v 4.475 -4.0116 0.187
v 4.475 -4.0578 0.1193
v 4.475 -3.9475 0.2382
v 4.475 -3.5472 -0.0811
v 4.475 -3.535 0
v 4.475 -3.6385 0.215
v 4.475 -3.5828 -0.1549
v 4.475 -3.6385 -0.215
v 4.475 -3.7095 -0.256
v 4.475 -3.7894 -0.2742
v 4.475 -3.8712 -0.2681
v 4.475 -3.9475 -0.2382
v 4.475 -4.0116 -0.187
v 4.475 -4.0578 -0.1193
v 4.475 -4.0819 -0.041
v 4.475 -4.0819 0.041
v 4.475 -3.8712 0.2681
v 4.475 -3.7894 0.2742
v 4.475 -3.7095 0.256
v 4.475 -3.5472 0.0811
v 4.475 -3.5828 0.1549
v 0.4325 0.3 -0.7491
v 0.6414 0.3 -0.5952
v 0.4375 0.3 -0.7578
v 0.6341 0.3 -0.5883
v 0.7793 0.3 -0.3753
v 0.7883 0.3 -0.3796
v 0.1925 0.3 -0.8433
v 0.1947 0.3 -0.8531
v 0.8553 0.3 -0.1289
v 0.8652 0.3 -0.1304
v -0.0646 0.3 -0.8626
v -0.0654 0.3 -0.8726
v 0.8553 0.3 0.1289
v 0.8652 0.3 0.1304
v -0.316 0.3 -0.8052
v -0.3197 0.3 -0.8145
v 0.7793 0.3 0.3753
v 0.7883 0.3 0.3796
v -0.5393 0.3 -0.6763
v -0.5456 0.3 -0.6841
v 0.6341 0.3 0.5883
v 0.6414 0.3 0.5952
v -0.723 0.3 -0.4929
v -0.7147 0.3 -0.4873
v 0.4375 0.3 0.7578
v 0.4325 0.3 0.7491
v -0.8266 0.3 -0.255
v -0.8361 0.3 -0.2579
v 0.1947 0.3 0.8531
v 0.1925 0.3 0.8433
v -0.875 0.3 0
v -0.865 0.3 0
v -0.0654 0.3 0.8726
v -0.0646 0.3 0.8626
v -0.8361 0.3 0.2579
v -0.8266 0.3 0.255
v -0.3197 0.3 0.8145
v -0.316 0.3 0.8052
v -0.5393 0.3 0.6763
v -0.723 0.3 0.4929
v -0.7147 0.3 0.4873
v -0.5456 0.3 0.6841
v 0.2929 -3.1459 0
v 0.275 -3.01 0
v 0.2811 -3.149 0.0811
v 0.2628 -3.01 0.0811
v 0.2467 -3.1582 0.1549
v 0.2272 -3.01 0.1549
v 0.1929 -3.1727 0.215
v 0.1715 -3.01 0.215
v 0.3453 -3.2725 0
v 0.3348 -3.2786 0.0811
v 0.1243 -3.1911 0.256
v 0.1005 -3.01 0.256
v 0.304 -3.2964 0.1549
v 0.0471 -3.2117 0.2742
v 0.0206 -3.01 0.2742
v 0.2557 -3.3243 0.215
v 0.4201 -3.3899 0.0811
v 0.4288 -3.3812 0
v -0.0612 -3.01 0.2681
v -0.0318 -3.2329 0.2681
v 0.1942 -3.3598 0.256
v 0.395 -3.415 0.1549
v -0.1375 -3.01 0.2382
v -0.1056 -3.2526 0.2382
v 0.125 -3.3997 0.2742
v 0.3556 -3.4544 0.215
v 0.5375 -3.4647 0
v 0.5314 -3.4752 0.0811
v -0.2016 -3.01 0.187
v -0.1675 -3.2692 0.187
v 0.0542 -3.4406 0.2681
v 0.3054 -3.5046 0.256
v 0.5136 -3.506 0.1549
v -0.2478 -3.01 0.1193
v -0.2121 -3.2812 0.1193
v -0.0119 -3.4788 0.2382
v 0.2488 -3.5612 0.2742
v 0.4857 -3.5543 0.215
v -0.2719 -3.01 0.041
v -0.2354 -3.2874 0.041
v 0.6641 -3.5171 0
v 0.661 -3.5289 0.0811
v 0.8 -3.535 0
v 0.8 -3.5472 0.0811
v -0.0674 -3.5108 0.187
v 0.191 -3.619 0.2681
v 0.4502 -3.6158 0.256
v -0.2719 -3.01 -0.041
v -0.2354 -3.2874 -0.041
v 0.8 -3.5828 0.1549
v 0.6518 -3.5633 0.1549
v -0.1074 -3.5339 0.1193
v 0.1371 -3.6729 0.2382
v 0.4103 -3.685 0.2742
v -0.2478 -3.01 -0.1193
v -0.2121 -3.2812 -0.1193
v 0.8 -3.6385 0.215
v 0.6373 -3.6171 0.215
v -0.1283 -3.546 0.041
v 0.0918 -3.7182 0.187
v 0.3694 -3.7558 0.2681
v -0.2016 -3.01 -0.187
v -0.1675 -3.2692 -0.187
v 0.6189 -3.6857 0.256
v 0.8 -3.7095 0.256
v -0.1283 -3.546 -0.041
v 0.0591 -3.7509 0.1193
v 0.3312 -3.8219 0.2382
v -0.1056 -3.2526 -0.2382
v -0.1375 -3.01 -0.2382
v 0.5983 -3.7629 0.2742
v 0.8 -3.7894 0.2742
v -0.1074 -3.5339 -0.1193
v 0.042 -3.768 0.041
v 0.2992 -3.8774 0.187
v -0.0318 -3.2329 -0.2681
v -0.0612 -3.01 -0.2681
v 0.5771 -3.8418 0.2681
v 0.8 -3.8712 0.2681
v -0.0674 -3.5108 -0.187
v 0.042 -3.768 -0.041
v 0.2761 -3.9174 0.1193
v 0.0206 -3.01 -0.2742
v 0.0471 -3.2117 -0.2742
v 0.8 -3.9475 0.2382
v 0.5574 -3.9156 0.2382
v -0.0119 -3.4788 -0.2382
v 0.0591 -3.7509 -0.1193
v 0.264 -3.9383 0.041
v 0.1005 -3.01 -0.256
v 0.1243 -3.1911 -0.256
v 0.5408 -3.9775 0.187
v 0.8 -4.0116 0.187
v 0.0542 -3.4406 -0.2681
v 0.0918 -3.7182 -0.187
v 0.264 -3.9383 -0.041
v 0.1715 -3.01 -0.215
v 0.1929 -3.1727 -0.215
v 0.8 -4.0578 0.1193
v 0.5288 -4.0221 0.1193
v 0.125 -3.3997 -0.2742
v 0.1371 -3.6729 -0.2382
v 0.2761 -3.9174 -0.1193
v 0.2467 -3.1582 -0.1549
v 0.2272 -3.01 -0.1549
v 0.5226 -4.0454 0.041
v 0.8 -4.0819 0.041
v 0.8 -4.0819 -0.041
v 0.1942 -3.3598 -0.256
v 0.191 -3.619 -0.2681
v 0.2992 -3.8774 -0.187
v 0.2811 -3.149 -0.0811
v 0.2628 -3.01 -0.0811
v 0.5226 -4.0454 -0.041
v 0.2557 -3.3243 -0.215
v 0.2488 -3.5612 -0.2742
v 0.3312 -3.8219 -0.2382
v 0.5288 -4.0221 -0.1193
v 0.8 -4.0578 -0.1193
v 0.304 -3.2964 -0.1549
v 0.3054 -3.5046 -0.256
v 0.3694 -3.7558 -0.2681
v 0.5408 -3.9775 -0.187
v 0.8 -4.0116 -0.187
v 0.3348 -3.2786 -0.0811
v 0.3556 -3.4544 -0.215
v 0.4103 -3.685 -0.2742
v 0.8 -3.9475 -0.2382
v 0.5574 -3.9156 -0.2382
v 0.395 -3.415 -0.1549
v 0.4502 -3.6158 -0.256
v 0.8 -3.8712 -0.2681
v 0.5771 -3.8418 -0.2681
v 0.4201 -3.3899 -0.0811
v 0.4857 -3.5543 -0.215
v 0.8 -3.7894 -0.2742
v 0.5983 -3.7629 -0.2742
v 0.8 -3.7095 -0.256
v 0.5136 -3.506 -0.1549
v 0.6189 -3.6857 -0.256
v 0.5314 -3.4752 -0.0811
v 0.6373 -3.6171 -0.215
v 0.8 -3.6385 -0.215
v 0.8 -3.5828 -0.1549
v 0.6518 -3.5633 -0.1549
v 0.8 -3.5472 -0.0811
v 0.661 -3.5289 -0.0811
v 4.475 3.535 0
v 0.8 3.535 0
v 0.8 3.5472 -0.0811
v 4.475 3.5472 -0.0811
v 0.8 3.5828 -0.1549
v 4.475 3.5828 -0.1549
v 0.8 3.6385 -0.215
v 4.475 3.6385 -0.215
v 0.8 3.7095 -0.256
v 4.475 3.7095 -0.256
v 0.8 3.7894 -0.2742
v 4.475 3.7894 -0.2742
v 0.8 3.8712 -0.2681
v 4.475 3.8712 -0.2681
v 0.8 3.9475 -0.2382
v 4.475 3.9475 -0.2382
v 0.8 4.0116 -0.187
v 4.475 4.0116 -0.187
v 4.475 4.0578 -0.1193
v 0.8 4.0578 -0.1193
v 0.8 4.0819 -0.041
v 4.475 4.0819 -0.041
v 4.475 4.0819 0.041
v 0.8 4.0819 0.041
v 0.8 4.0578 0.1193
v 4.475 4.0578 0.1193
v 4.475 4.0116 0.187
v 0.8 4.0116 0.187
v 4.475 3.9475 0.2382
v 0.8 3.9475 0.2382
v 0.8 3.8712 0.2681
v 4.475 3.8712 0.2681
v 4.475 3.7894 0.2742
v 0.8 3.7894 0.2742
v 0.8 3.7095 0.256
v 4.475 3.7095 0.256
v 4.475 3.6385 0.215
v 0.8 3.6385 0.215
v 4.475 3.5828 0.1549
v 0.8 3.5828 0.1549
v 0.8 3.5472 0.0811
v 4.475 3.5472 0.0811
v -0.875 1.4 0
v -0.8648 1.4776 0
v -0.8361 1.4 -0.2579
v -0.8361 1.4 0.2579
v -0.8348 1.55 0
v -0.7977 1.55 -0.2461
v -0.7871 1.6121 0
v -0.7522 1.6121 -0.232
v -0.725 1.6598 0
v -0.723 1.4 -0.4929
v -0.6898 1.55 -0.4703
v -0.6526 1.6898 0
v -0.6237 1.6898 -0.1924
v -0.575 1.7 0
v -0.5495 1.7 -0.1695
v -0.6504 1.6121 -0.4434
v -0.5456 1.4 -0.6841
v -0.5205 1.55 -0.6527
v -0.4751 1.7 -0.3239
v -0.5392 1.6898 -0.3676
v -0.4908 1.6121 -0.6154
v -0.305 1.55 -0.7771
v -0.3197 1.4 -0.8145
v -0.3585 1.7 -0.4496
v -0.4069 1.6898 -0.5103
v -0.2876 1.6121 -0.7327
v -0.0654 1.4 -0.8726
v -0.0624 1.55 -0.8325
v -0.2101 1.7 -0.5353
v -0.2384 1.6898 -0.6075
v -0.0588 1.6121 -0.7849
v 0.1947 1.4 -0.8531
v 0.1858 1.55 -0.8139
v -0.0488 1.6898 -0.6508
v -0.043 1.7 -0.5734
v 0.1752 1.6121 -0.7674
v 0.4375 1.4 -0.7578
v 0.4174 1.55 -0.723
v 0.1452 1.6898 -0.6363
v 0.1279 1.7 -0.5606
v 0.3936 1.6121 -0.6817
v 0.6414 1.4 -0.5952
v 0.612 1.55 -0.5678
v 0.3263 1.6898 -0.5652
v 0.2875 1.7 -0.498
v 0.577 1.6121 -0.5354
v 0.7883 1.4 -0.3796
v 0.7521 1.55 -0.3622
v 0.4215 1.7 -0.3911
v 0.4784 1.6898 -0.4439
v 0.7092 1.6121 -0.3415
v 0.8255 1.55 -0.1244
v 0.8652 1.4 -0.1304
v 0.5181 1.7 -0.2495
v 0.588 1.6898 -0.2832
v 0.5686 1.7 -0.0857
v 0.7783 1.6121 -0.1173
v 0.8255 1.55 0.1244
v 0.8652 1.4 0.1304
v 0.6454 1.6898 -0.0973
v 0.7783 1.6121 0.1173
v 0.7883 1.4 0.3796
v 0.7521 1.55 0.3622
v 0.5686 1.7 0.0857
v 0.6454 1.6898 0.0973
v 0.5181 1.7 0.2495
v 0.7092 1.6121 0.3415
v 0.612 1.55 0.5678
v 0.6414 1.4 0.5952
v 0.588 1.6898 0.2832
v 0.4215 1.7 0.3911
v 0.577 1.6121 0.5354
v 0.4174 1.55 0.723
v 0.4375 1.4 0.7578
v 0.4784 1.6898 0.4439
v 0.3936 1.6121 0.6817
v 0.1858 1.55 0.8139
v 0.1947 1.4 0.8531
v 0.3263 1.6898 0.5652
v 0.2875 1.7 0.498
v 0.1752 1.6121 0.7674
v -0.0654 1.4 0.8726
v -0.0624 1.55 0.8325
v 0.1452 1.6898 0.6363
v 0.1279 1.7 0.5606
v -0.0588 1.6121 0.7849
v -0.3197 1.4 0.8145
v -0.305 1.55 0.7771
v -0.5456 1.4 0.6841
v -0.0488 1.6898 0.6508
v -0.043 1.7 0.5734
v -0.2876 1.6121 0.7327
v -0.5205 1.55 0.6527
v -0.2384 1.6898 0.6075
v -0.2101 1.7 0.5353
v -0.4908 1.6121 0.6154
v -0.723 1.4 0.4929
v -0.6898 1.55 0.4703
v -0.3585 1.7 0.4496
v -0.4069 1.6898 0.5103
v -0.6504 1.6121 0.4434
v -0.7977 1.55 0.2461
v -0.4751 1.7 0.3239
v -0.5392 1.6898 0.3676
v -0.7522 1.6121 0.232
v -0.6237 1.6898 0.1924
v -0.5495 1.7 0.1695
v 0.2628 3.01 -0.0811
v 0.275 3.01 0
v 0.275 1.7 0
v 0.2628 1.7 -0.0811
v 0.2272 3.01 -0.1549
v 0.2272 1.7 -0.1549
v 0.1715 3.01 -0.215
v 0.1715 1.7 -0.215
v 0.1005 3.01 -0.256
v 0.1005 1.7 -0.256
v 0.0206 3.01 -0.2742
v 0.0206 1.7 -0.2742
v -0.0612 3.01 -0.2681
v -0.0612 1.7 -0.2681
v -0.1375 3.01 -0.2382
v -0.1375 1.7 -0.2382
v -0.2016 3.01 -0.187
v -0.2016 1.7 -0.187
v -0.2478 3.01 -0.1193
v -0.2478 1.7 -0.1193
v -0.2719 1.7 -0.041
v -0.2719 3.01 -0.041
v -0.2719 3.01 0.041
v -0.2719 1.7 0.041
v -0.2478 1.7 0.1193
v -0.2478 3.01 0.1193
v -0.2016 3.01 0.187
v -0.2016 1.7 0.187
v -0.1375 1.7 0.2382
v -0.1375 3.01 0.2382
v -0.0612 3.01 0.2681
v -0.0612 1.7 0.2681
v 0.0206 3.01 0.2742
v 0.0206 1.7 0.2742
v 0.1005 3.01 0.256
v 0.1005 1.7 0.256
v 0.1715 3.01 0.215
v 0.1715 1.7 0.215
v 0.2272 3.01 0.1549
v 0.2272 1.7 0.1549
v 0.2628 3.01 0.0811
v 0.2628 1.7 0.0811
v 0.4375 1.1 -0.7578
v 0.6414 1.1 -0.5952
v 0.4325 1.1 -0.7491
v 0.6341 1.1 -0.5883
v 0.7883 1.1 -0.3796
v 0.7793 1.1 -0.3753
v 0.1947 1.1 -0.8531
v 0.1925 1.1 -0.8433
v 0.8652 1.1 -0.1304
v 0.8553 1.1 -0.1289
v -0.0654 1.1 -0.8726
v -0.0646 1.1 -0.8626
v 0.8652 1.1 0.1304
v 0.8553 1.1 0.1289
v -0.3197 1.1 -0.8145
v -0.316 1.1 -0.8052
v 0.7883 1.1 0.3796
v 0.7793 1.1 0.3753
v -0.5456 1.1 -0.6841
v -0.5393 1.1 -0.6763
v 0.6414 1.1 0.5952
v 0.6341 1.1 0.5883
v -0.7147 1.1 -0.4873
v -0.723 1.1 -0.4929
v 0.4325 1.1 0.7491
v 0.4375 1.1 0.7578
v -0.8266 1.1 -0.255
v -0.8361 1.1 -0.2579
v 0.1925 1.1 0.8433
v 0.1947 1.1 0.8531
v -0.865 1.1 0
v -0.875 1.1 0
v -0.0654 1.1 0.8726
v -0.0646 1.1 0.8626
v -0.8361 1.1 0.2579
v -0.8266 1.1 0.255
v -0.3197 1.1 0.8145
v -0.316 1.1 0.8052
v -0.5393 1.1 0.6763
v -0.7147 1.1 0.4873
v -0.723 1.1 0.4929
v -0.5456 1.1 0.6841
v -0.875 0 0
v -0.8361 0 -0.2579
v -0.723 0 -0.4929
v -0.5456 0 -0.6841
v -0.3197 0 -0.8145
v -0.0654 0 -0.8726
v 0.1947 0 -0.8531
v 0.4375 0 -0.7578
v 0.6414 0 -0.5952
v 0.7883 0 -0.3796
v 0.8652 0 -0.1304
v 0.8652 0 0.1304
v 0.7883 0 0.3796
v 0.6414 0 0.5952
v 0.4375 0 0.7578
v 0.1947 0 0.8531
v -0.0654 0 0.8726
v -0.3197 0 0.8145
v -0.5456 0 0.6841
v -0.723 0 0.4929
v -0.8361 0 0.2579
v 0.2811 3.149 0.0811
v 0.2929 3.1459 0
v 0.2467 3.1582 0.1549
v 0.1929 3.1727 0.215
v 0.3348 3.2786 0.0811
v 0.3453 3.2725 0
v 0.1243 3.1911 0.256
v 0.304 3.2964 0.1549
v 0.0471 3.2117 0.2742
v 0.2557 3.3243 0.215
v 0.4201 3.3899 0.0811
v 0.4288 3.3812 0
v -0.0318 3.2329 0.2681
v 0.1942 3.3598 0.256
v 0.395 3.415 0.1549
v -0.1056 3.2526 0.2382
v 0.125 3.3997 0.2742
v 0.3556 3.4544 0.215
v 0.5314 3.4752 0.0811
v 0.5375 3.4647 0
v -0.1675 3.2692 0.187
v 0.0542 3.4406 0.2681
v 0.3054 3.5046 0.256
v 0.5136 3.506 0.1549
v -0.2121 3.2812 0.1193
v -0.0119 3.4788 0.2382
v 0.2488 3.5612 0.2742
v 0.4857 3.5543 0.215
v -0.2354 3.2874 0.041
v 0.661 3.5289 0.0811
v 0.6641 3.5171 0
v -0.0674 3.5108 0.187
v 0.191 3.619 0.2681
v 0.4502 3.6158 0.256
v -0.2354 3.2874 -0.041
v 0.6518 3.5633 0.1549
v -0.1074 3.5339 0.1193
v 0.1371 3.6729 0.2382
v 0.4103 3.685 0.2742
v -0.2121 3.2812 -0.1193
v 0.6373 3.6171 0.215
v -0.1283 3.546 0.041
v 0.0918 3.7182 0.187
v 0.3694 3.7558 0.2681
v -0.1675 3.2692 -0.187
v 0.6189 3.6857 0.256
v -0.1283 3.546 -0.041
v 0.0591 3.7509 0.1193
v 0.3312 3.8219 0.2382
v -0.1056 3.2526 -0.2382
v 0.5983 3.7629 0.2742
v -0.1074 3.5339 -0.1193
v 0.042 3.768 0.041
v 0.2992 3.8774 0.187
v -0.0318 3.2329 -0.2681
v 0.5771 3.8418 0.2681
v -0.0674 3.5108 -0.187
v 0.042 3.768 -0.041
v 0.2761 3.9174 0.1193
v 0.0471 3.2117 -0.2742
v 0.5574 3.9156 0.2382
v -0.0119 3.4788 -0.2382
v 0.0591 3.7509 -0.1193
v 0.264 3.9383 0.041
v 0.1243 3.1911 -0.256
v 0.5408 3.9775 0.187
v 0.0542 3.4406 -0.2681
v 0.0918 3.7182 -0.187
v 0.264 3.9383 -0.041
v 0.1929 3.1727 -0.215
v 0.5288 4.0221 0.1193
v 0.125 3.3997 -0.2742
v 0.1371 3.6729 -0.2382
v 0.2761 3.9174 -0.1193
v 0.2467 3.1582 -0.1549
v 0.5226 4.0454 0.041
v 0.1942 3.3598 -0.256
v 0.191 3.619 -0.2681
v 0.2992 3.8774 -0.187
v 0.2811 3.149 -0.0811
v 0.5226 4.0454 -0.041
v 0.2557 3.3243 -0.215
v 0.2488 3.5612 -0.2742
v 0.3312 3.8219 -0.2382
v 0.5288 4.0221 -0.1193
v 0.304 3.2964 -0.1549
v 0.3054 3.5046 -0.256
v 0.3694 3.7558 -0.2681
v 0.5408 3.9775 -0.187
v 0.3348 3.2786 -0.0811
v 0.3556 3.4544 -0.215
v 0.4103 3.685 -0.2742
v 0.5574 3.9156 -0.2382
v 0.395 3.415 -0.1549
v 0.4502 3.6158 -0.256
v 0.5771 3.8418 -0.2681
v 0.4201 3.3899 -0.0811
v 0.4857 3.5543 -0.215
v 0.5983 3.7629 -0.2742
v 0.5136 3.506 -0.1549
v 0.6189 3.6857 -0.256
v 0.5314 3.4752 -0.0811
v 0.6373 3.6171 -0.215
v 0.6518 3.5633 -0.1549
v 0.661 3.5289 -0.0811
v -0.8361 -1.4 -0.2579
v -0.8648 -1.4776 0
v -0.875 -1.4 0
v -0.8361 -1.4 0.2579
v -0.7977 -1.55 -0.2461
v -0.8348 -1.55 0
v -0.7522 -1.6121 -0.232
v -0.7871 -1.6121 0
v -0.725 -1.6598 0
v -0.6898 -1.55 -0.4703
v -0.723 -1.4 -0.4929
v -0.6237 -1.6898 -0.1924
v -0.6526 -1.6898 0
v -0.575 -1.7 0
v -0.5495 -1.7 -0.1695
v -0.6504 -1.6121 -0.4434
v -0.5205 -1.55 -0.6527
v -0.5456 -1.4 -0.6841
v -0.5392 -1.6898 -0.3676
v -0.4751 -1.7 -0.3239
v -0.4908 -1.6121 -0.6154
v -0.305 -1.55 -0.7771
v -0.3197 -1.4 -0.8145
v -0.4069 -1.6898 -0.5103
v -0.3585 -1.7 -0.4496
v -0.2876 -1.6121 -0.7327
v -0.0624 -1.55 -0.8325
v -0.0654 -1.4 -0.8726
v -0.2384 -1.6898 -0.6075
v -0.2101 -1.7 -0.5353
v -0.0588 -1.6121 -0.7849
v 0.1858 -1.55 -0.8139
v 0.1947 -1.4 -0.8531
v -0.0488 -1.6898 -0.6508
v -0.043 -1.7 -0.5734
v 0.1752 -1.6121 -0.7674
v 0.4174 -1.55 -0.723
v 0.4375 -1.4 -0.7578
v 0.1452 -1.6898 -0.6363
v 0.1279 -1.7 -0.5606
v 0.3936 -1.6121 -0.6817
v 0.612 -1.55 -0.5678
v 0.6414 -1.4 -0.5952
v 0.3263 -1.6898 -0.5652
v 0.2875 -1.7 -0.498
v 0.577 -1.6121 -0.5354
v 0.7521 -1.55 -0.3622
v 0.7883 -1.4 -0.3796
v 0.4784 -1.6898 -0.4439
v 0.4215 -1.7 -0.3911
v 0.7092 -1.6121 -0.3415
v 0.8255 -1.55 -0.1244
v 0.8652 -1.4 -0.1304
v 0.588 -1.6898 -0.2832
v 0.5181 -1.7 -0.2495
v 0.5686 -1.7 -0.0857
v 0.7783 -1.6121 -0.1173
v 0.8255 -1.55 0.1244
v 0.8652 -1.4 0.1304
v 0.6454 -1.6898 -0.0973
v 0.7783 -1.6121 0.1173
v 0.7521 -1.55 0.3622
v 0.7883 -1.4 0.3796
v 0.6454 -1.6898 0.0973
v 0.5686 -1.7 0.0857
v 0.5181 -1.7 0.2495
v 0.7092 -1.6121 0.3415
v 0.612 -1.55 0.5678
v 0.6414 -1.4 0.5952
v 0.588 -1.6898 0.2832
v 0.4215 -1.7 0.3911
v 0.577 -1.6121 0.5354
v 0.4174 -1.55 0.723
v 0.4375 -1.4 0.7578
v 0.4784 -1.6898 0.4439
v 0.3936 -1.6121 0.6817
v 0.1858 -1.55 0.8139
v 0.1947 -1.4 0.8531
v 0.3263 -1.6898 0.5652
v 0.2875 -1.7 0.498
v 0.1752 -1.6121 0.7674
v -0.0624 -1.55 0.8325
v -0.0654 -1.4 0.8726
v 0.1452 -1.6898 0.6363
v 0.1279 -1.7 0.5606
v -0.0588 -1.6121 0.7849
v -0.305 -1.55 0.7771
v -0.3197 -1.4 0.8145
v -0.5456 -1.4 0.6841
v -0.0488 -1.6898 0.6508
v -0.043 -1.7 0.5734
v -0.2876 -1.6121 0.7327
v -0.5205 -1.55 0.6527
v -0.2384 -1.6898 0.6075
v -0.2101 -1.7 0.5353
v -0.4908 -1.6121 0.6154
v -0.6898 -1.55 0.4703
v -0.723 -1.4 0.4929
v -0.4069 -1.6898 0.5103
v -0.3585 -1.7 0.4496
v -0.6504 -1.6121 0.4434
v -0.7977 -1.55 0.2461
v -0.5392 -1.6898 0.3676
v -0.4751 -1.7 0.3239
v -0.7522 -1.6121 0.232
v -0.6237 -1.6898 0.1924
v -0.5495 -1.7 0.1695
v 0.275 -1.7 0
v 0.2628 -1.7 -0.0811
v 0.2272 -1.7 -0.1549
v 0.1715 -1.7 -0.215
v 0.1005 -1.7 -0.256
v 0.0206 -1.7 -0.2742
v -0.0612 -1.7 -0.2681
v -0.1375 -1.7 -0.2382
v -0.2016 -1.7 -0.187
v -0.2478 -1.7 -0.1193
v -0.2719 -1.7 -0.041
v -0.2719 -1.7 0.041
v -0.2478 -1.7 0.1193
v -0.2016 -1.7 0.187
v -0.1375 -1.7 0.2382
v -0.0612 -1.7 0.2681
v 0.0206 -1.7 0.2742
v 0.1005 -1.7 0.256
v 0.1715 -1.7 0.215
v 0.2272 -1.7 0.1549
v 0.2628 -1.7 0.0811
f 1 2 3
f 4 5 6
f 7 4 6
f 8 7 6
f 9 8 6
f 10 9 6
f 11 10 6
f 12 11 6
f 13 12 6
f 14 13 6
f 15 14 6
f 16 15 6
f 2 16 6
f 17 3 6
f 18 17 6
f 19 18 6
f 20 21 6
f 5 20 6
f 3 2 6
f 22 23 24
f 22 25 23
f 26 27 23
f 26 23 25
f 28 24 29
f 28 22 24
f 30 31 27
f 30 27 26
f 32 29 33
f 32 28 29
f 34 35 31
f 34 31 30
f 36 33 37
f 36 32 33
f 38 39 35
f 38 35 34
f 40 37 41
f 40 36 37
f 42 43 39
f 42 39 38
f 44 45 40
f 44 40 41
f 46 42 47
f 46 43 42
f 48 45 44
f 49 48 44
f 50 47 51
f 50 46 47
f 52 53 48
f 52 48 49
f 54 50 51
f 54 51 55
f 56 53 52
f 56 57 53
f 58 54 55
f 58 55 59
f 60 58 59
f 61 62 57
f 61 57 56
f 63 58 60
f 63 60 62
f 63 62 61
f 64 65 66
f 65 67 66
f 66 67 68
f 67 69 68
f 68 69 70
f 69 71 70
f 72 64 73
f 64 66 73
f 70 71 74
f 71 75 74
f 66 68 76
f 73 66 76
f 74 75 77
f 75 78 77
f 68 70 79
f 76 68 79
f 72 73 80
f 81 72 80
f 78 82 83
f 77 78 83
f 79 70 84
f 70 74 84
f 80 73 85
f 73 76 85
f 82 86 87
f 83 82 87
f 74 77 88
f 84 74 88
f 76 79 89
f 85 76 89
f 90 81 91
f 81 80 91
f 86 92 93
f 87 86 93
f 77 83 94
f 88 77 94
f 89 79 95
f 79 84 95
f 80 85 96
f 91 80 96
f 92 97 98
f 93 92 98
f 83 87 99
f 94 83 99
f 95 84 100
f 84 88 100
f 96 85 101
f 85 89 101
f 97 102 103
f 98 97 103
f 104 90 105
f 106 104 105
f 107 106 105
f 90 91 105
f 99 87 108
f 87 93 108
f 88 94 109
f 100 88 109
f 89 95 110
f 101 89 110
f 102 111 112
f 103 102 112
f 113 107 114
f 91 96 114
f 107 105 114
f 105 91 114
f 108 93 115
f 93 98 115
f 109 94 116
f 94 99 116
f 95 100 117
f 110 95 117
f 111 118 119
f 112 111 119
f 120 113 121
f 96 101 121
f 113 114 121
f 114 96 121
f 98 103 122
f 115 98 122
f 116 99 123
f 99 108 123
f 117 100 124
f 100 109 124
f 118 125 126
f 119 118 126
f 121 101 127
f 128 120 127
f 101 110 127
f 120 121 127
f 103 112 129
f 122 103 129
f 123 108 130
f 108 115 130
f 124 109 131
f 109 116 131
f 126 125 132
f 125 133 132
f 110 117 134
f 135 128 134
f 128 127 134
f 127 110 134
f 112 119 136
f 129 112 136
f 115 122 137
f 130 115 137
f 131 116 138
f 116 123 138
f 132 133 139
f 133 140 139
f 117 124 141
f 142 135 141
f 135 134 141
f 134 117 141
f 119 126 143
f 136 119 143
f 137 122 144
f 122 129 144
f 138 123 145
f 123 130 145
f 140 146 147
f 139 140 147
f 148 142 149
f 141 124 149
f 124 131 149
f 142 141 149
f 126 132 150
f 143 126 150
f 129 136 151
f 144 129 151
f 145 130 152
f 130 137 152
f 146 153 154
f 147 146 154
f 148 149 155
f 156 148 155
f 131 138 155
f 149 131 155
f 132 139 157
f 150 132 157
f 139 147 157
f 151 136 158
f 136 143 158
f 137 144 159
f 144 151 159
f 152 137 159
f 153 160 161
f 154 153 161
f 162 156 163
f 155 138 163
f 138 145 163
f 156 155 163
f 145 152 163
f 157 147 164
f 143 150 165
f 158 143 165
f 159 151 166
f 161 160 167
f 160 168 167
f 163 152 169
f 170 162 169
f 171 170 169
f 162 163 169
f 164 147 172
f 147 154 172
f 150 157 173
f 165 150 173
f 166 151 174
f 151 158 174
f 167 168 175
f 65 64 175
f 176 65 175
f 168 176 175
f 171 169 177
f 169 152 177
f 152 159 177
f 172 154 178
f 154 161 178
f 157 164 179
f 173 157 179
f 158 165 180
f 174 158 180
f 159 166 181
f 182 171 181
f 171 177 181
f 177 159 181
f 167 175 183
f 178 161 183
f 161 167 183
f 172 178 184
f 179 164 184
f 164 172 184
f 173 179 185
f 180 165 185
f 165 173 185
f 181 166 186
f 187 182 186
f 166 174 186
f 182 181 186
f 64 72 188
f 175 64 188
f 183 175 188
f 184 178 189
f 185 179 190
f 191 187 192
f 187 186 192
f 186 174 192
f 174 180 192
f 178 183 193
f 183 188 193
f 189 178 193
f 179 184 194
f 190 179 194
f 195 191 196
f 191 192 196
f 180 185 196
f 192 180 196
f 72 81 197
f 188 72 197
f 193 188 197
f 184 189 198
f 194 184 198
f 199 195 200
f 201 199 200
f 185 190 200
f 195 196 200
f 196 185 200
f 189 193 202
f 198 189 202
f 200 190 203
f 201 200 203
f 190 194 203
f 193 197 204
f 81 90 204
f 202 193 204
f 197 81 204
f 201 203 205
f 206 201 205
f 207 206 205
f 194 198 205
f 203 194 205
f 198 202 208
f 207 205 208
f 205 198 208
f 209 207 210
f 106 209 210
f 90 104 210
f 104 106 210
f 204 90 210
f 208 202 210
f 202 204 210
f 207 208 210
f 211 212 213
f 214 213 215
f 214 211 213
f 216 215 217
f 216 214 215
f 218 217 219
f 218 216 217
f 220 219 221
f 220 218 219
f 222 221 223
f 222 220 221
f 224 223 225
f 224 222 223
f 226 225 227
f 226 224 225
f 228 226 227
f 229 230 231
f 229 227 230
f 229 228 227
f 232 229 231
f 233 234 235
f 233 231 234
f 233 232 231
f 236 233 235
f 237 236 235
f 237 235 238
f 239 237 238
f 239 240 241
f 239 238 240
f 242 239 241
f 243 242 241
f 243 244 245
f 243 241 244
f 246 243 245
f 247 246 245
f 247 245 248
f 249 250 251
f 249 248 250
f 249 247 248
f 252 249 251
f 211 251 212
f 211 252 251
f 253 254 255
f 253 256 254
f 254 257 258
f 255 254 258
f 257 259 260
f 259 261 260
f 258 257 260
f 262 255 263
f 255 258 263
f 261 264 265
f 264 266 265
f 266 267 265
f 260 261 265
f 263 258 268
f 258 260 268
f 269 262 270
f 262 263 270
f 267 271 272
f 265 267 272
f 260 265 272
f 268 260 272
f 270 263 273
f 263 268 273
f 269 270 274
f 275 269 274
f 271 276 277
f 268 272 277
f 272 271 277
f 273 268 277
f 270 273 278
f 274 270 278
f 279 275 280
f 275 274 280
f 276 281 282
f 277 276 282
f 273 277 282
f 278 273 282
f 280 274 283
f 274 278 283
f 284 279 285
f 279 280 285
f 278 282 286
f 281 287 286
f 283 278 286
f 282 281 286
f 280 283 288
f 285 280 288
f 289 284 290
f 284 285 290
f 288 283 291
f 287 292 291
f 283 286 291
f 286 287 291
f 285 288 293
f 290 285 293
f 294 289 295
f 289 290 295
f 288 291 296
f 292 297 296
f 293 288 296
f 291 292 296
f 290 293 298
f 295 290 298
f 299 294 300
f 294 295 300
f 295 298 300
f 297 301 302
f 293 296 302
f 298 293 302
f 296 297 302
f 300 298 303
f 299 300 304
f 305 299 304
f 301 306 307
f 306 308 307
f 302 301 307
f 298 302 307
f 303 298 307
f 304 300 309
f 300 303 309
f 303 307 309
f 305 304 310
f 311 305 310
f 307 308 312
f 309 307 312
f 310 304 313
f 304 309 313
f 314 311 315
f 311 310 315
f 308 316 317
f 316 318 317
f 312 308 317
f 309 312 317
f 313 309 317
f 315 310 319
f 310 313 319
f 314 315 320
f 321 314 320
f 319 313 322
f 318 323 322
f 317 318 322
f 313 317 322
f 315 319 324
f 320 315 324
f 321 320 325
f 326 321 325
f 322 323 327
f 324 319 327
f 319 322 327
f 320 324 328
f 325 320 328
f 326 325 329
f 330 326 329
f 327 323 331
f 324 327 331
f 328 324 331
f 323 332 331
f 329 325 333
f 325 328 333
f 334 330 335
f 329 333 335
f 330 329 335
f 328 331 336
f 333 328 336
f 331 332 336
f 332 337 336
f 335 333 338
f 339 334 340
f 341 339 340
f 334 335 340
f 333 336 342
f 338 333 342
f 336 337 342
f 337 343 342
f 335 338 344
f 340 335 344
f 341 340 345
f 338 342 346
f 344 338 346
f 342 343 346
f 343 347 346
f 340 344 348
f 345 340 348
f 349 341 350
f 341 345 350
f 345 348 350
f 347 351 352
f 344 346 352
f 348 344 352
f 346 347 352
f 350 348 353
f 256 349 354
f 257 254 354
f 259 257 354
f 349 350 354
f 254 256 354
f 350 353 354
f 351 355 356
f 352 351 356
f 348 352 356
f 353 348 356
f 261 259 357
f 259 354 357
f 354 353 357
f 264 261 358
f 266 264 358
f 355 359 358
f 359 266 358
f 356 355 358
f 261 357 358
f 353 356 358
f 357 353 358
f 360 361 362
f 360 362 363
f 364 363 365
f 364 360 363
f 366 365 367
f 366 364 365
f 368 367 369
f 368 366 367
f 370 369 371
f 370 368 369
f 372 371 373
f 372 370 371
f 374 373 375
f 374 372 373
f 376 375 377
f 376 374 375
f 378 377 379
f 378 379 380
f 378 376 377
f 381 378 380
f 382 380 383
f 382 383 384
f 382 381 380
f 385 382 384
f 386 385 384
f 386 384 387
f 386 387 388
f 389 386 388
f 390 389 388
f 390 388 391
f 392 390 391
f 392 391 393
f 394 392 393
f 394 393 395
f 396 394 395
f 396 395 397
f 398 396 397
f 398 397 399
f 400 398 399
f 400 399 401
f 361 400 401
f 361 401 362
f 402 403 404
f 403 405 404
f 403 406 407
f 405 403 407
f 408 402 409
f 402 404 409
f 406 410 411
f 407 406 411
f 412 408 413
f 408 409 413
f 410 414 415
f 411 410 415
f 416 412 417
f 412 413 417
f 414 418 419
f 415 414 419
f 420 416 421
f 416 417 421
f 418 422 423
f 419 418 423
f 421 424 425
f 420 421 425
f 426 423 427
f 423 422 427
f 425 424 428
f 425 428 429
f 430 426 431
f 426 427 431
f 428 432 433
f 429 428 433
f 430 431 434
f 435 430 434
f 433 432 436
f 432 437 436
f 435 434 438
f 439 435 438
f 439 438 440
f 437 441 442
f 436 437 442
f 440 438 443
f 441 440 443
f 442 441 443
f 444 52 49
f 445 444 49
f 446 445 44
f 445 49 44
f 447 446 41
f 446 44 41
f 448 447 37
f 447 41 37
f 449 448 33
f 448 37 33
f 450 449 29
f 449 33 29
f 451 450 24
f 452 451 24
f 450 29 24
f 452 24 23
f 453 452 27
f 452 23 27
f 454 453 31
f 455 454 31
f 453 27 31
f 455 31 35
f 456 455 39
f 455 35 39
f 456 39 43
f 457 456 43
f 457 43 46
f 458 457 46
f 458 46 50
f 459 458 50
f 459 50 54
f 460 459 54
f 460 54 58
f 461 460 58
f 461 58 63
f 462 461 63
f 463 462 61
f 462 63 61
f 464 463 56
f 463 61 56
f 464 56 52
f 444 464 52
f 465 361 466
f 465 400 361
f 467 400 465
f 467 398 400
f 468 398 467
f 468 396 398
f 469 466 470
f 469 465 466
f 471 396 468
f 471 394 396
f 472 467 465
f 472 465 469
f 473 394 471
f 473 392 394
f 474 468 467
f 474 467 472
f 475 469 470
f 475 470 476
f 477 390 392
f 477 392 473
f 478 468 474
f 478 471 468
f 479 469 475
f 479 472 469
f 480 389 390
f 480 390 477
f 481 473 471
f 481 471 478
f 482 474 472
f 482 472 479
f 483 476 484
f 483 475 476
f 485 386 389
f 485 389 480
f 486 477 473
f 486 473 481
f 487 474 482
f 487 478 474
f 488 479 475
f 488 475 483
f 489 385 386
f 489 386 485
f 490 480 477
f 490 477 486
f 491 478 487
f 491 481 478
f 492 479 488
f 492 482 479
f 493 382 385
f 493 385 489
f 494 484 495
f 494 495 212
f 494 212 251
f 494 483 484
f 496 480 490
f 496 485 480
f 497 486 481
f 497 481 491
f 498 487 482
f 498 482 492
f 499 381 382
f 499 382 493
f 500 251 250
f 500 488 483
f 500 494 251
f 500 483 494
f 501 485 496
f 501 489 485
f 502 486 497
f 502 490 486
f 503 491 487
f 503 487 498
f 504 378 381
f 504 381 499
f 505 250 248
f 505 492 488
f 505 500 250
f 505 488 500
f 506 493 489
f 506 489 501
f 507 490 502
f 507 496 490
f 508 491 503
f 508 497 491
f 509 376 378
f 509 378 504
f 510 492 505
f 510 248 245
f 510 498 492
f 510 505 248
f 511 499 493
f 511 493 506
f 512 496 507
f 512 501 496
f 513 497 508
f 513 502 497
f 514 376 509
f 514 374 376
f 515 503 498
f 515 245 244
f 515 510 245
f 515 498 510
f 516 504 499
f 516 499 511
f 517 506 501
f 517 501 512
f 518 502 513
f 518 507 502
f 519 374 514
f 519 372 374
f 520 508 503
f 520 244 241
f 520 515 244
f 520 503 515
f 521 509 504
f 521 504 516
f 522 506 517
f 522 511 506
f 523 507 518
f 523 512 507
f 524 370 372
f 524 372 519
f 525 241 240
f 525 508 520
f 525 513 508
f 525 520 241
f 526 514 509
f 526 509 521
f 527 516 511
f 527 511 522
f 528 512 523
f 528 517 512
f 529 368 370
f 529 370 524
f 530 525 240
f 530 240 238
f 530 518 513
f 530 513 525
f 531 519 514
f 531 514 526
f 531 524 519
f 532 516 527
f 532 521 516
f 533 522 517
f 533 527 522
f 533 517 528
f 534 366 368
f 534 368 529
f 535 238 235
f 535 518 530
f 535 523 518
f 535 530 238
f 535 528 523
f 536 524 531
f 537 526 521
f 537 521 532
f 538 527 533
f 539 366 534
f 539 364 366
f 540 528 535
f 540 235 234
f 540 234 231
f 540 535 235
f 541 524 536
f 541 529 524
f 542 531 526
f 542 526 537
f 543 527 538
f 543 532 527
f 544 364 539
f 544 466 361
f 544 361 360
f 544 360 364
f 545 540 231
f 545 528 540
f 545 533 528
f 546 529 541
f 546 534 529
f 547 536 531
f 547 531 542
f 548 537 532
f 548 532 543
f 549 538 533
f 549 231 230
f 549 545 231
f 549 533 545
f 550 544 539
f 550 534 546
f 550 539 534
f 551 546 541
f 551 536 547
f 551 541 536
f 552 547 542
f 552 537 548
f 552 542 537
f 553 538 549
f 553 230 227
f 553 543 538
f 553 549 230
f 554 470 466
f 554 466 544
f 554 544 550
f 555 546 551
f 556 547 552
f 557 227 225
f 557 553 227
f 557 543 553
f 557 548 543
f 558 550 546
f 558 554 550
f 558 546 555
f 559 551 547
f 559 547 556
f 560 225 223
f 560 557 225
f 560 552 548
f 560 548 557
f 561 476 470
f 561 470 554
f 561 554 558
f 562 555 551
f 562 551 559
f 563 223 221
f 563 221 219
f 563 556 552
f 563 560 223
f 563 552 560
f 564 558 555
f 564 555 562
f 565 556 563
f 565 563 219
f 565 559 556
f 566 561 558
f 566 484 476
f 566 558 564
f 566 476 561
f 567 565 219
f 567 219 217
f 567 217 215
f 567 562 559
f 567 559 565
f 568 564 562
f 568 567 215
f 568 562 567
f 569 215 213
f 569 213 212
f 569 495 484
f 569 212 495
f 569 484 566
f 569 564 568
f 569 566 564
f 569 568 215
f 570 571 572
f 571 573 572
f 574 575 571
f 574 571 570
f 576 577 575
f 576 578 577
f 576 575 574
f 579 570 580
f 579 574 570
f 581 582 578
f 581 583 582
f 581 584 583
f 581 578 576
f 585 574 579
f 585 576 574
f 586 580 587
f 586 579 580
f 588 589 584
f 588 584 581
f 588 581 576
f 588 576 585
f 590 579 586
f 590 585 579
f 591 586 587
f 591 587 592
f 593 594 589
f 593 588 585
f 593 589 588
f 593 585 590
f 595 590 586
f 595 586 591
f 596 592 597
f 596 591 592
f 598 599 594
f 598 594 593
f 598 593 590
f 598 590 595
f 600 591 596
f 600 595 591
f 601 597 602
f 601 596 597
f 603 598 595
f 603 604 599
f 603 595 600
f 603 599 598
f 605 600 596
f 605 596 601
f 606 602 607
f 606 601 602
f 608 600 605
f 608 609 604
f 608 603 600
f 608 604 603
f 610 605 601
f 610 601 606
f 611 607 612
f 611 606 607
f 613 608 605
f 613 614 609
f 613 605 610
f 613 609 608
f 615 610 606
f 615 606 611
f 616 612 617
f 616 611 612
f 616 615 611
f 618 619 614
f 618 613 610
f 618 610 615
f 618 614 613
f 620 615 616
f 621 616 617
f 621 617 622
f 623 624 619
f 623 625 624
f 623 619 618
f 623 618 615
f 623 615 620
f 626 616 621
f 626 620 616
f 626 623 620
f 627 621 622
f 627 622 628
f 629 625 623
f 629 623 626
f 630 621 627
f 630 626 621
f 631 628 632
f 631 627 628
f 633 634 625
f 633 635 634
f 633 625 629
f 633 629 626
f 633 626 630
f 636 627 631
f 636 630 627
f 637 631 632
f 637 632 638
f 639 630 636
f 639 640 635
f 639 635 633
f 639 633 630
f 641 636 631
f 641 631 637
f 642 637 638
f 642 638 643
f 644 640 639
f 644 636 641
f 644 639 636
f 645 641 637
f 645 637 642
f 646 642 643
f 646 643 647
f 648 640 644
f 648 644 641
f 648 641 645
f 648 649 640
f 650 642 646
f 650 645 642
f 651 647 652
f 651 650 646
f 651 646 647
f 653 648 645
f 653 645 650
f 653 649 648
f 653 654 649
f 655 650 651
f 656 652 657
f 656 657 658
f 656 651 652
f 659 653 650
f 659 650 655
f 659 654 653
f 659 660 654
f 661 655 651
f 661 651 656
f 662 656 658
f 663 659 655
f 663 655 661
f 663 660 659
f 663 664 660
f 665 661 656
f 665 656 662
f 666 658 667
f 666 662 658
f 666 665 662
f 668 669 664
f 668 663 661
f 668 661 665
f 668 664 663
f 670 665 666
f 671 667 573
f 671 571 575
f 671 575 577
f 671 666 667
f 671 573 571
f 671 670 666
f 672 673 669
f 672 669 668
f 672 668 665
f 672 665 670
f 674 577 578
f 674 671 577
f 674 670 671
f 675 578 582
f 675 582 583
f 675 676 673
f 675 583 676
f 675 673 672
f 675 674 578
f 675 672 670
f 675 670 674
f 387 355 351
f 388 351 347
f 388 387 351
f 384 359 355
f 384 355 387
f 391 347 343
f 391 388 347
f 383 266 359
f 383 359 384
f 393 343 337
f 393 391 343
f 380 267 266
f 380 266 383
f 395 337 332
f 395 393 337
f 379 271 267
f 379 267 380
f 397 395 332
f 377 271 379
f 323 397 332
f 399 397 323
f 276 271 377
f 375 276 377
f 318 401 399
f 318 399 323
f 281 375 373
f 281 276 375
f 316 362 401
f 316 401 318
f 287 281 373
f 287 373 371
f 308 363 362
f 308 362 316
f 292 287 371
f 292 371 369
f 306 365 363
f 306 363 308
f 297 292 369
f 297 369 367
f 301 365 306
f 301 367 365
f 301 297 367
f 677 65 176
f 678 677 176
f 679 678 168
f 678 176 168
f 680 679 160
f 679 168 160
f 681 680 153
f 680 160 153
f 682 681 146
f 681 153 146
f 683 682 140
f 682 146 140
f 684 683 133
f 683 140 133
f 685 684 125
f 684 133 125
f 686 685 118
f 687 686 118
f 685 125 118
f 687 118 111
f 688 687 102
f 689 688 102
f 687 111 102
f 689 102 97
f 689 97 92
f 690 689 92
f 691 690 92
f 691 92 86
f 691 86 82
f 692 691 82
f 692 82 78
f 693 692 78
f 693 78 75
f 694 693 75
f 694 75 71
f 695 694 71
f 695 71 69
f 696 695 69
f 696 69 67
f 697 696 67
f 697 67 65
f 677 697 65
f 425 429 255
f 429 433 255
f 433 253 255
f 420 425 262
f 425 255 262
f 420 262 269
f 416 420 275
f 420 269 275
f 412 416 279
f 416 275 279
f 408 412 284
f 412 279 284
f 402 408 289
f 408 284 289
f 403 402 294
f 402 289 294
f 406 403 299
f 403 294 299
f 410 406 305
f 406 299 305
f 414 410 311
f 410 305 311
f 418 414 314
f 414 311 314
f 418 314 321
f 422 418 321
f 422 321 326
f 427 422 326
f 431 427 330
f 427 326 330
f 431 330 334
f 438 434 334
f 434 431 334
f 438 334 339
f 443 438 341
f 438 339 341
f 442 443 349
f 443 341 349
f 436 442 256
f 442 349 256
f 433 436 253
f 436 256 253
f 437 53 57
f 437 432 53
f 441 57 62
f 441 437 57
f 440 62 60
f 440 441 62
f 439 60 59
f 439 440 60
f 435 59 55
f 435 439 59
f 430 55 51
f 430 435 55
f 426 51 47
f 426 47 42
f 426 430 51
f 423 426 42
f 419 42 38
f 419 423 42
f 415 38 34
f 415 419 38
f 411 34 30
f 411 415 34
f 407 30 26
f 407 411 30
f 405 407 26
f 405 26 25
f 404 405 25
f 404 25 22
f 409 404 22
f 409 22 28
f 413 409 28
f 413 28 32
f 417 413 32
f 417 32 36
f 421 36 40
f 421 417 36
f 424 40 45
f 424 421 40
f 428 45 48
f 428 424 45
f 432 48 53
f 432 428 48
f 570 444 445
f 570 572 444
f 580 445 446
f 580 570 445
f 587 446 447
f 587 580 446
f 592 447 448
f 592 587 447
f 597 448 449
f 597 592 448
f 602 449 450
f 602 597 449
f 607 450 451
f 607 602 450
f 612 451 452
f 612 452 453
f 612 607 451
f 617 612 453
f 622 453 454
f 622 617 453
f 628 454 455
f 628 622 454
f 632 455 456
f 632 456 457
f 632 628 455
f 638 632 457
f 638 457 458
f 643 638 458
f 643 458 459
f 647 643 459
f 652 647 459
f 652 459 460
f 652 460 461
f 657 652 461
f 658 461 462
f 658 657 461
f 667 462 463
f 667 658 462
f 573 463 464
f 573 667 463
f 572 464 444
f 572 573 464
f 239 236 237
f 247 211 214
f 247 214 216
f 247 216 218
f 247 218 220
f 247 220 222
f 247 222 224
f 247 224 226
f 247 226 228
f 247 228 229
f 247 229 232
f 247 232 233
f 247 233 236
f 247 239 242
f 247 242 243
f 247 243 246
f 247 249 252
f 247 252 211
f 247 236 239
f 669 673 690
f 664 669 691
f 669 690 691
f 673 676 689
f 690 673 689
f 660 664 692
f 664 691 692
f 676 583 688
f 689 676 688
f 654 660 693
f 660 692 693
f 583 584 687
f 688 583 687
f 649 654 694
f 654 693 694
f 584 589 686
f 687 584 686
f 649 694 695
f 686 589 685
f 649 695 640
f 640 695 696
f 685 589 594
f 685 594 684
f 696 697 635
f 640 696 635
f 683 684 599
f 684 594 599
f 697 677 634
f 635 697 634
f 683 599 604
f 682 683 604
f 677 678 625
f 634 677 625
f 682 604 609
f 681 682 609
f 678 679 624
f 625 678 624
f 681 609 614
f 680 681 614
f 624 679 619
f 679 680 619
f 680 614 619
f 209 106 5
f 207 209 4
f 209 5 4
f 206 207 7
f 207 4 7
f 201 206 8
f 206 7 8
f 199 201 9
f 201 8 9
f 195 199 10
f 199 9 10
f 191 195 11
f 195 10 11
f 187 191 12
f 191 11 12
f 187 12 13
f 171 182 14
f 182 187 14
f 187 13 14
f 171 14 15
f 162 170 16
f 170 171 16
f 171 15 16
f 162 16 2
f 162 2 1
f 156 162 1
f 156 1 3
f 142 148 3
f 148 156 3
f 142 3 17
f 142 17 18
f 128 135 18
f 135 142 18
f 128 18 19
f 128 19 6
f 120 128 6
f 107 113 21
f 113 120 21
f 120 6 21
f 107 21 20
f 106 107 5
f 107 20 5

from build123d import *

# Parameters (mm, degrees)
ESQUISSE1_W           = 0.875
ESQUISSE1_H           = 1.7
CONG_1_R              = 0.3
ESQUISSE3_R           = 0.275
CONG_1_OF_SYM_TRIE1_R = 0.3
ESQUISSE4_W           = 0.01
ESQUISSE4_H           = 0.8


with BuildPart() as part:
    # Esquisse1 → Révolution1 (revolve)
    with BuildSketch(Plane.XY, mode=Mode.PRIVATE) as r_volution1_sk:
        with Locations((0.4375, 0.85)):
            Rectangle(ESQUISSE1_W, ESQUISSE1_H)
    r_volution1 = revolve(r_volution1_sk.sketch.rotate(Axis((0, 1.7, 0), (0, -1, 0)), 180), axis=Axis((0, 1.7, 0), (0, -1, 0)))

    # Congé1
    cong_1_edges = [part.edges().sort_by_distance(p)[0] for p in [
        (0.875, 1.7, 0),
    ]]
    fillet(cong_1_edges, radius=CONG_1_R)

    # Balayage1: sweep along a path in Esquisse2
    with BuildLine(Plane.XY) as balayage1_path:
        Line((0, 1.7), (0, 3.01))
        ThreePointArc((0, 3.01), (0.234314575, 3.575685425), (0.8, 3.81))
        Line((0.8, 3.81), (4.475, 3.81))
    # Esquisse3 → Balayage1 (sweep)
    with BuildSketch(Plane(origin=(0, 1.7, 0), x_dir=(1, 0, 0), z_dir=(0, 1, 0))):
        Circle(ESQUISSE3_R)
    balayage1 = sweep(path=balayage1_path.line)


with BuildPart() as sym_trie1_1:
    # Symétrie1: Révolution1, Balayage1 across Top Plane
    add(r_volution1.mirror(Plane(origin=(0, 0, 0), x_dir=(1, 0, 0), z_dir=(0, 1, 0))))
    add(balayage1.mirror(Plane(origin=(0, 0, 0), x_dir=(1, 0, 0), z_dir=(0, 1, 0))))

    # Congé1 of Symétrie1
    cong_1_of_sym_trie1_edges = [sym_trie1_1.edges().sort_by_distance(p)[0] for p in [
        (0.875, -1.7, 0),
    ]]
    fillet(cong_1_of_sym_trie1_edges, radius=CONG_1_OF_SYM_TRIE1_R)


with BuildPart() as part_1:
    add(part.part)

    # Symétrie1 united with what the copies to: union Symétrie1_1
    add(sym_trie1_1.part)

    # Esquisse4 → Enlèvement de matière-Révolution1 (revolve, cut)
    with BuildSketch(Plane.XY):
        with Locations((-0.87, 0.7)):
            Rectangle(ESQUISSE4_W, ESQUISSE4_H)
    revolve(axis=Axis((0, -1.4, 0), (0, 1, 0)), mode=Mode.SUBTRACT)


solid = part_1.part
